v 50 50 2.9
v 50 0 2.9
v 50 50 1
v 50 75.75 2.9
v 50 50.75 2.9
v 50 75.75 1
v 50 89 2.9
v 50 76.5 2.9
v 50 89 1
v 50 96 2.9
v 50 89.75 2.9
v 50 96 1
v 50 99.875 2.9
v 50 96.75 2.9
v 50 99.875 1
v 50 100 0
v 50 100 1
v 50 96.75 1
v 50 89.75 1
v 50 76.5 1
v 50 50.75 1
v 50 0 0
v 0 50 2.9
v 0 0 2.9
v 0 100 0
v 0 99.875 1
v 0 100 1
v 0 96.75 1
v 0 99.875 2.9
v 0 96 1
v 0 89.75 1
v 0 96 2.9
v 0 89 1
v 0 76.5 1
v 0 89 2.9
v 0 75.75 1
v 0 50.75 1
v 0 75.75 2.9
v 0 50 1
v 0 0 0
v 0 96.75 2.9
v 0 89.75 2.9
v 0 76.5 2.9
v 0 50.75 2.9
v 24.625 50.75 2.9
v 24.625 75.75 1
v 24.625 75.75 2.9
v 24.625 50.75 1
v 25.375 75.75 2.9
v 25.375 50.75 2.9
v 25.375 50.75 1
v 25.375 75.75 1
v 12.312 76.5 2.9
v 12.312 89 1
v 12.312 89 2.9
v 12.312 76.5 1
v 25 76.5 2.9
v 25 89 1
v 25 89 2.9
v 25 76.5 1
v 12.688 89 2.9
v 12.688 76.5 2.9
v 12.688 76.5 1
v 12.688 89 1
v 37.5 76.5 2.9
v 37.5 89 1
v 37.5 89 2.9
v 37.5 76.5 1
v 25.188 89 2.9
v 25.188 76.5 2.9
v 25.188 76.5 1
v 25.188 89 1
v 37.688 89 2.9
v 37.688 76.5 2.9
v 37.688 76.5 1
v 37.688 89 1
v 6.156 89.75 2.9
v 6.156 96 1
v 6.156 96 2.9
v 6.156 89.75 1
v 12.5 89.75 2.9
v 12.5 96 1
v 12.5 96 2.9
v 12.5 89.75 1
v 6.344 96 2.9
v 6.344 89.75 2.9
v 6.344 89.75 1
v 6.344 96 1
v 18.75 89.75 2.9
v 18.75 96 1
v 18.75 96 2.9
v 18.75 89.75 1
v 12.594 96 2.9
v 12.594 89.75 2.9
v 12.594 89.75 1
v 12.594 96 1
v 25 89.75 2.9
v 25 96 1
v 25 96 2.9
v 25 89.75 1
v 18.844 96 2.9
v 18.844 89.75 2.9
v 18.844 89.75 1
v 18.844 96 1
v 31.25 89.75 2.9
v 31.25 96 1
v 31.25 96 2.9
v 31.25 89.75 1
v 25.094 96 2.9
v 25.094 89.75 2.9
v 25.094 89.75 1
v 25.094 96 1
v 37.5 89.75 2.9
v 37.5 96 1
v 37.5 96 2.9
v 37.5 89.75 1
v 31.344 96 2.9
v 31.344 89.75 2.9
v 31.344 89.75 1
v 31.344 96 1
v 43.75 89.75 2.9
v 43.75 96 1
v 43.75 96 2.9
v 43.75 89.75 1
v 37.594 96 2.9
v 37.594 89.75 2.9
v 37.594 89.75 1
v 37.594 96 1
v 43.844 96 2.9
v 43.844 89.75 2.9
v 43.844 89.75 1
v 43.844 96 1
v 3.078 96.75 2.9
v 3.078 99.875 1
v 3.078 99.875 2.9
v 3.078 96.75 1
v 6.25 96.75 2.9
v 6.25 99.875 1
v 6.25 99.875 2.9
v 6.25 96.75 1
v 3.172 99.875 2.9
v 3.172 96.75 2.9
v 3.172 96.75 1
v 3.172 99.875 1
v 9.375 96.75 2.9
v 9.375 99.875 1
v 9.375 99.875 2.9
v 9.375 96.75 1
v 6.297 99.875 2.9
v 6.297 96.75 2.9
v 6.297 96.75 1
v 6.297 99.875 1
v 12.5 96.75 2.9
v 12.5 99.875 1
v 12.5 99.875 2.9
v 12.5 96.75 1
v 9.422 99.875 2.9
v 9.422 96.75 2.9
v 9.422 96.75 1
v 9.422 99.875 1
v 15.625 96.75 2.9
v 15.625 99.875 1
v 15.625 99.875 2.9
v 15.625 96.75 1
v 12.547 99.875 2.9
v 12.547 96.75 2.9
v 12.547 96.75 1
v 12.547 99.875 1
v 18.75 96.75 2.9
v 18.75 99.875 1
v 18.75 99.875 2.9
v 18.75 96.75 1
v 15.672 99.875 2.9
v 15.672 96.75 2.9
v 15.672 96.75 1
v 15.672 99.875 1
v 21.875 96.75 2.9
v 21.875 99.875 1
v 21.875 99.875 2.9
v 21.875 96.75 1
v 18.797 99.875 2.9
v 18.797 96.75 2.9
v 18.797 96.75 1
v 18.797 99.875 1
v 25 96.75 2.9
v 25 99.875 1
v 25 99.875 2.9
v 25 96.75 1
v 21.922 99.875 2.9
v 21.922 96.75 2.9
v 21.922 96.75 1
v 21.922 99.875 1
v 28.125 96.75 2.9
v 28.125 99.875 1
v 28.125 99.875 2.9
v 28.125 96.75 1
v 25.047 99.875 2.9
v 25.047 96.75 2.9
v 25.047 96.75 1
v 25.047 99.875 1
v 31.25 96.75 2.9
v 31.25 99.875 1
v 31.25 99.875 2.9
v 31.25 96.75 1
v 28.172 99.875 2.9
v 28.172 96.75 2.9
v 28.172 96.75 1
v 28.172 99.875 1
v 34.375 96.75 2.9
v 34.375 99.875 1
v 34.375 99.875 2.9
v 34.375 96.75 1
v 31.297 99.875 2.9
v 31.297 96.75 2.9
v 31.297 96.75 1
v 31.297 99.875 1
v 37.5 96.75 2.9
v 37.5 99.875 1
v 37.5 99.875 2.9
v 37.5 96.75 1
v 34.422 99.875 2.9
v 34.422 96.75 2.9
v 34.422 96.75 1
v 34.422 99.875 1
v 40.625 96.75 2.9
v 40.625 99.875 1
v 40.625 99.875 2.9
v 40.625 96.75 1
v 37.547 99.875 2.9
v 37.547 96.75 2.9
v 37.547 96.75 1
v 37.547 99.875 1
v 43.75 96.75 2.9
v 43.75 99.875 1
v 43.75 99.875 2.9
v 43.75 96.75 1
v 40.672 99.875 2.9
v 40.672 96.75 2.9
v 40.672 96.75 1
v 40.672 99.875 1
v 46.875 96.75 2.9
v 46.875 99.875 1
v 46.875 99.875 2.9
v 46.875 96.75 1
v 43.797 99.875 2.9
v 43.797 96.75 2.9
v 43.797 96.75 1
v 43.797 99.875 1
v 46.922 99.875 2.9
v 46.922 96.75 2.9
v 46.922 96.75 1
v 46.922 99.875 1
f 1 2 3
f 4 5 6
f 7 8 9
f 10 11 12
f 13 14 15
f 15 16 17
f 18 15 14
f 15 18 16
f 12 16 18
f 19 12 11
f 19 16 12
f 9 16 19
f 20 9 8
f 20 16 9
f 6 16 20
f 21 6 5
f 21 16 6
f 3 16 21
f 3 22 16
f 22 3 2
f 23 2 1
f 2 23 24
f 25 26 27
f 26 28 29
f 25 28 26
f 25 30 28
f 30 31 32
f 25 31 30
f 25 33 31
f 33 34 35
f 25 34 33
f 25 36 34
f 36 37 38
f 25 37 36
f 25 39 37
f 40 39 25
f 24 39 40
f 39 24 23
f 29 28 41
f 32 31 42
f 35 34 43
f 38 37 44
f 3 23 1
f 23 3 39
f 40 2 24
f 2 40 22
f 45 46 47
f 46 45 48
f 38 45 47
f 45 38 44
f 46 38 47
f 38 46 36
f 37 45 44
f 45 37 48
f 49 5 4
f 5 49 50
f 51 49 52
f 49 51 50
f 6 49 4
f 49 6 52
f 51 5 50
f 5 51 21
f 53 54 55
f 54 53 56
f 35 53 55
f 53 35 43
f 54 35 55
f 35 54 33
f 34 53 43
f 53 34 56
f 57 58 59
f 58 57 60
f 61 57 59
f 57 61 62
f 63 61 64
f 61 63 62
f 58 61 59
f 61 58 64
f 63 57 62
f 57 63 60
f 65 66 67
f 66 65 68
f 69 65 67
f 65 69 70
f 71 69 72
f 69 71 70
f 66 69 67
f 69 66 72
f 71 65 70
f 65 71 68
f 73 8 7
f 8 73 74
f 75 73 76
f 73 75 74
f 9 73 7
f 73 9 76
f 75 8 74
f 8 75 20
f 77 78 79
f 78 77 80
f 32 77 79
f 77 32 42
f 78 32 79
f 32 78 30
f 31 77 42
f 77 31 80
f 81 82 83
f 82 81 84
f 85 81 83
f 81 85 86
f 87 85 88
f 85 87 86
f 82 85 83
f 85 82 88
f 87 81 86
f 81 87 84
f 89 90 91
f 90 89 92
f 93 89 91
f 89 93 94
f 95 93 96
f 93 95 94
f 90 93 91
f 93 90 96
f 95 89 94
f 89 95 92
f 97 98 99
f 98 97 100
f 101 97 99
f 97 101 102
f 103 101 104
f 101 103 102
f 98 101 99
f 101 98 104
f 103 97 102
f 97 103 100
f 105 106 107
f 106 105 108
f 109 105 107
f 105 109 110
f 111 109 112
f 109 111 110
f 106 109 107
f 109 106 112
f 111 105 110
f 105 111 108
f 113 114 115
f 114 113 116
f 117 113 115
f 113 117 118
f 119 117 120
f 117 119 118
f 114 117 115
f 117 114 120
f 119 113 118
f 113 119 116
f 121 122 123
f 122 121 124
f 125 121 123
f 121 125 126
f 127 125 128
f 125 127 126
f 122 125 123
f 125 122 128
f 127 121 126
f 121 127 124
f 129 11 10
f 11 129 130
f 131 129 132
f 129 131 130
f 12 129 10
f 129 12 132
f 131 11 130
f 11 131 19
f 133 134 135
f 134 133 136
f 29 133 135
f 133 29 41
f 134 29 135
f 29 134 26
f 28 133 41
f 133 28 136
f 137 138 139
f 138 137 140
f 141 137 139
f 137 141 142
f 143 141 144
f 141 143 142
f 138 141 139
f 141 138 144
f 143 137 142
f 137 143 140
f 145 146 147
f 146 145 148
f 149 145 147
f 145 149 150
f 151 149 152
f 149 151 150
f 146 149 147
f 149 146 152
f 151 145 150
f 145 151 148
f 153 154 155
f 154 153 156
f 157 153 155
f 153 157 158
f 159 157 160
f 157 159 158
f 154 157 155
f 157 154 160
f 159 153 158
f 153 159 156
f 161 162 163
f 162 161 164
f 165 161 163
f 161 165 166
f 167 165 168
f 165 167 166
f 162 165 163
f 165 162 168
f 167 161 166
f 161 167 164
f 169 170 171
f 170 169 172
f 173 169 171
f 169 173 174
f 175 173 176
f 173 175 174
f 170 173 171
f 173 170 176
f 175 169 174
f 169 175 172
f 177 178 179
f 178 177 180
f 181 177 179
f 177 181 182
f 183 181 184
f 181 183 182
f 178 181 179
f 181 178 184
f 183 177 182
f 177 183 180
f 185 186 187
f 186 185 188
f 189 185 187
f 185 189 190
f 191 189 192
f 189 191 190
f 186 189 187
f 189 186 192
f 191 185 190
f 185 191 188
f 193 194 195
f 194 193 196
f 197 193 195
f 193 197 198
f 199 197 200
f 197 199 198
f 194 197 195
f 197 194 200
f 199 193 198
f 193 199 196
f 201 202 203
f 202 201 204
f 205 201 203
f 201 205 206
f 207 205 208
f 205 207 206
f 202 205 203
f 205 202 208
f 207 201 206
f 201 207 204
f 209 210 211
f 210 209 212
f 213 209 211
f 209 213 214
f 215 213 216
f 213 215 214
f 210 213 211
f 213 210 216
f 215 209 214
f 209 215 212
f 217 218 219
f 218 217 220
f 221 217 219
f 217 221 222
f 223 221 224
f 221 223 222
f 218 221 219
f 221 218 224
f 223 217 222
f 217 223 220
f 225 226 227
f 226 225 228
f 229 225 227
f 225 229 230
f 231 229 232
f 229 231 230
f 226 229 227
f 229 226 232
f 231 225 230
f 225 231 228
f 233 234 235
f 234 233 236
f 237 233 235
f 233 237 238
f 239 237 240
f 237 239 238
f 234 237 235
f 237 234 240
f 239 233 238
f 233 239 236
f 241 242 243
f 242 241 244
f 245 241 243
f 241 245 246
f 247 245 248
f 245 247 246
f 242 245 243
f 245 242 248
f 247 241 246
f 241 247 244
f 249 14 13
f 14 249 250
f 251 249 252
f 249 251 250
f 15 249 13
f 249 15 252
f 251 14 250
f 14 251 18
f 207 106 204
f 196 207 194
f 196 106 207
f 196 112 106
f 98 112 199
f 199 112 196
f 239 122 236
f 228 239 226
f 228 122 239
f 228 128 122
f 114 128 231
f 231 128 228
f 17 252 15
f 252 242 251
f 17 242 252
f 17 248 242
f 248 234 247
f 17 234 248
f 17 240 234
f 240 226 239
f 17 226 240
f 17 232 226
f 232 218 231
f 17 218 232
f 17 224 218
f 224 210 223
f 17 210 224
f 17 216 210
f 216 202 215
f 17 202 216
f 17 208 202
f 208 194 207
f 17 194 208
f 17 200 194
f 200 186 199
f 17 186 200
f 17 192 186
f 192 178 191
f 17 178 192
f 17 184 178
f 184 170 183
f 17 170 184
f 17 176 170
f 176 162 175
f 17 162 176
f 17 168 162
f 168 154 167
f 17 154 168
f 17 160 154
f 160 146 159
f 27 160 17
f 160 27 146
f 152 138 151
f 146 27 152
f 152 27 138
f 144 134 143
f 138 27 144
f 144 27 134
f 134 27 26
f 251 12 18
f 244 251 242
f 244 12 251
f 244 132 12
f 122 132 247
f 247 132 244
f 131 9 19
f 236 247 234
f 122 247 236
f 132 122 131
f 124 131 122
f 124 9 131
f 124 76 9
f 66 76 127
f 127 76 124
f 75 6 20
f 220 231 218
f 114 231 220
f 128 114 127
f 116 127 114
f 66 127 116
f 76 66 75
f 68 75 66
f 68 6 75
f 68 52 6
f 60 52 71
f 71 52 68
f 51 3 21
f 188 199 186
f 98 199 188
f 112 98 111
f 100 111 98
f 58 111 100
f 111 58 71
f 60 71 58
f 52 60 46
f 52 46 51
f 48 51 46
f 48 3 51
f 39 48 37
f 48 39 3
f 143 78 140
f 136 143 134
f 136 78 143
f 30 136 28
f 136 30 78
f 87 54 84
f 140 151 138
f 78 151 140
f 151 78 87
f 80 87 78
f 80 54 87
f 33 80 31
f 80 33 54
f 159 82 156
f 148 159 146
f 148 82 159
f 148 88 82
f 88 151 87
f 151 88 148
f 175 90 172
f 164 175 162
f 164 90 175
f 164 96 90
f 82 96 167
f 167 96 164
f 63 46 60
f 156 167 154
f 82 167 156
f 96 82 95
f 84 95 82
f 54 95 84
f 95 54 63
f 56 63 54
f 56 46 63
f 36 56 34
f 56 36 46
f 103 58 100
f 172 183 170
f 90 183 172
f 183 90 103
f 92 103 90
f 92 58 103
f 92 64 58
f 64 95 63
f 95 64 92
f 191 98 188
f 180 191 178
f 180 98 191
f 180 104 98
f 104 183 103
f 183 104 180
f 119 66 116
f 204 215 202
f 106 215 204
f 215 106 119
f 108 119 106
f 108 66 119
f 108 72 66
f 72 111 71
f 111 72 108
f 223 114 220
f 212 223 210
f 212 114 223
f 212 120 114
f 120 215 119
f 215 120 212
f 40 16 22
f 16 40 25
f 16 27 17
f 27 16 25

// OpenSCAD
//All units are in millimeters

//Optimal settings
$fa = 1;
$fs = 0.4;

//Global constants
function separation() = 0.75;
function baseWidth() = 50;
function baseLength() = 50;
function baseHeight() = 2;

rotate([0, 0, 90])
    translate([0,-50,0])
        cube([100, 50, 1]);
translate([0,0,1-0.1])    
    pattern();

module pattern(){
    cube([baseWidth(), baseLength(), baseHeight()]);

    translate([0,baseWidth()+separation(),0])
        cube([baseWidth()/2-separation()/2, baseLength()/2, baseHeight()]);
    translate([baseLength()/2+separation()/2,baseWidth()+separation(),0])
        cube([baseWidth()/2-separation()/2, baseLength()/2, baseHeight()]);
        
    translate([0,baseWidth()+separation(),0])
        cube([baseWidth()/2-separation()/2, baseLength()/2, baseHeight()]);
    translate([baseLength()/2+separation()/2,baseWidth()+separation(),0])
        cube([baseWidth()/2-separation()/2, baseLength()/2, baseHeight()]);
        
    translate([0,baseWidth()+ baseWidth()/2 + separation()*2,0])
        cube([baseWidth()/4-separation()/4, baseLength()/4, baseHeight()]);
    translate([baseLength()/4+separation()/4,baseWidth()+baseWidth()/2+separation()*2,0])
        cube([baseWidth()/4-separation()/4, baseLength()/4, baseHeight()]);
    translate([2*baseLength()/4+separation()/4,baseWidth()+ baseWidth()/2 + separation()*2,0])
        cube([baseWidth()/4-separation()/4, baseLength()/4, baseHeight()]);
    translate([3*baseLength()/4+separation()/4,baseWidth()+baseWidth()/2+separation()*2,0])
        cube([baseWidth()/4-separation()/4, baseLength()/4, baseHeight()]);
        
    translate([0,baseWidth()+ baseWidth()/2+ baseWidth()/4 + separation()*3,0])
        cube([baseWidth()/8-separation()/8, baseLength()/8, baseHeight()]);
    translate([baseLength()/8+separation()/8,baseWidth()+baseWidth()/2+baseWidth()/4+separation()*3,0])
        cube([baseWidth()/8-separation()/8, baseLength()/8, baseHeight()]);
    translate([2*baseLength()/8+separation()/8,baseWidth()+baseWidth()/2+baseWidth()/4+separation()*3,0])
        cube([baseWidth()/8-separation()/8, baseLength()/8, baseHeight()]);
    translate([3*baseLength()/8+separation()/8,baseWidth()+baseWidth()/2+baseWidth()/4+separation()*3,0])
        cube([baseWidth()/8-separation()/8, baseLength()/8, baseHeight()]);
    translate([4*baseLength()/8+separation()/8,baseWidth()+ baseWidth()/2+ baseWidth()/4 + separation()*3,0])
        cube([baseWidth()/8-separation()/8, baseLength()/8, baseHeight()]);
    translate([5*baseLength()/8+separation()/8,baseWidth()+baseWidth()/2+baseWidth()/4+separation()*3,0])
        cube([baseWidth()/8-separation()/8, baseLength()/8, baseHeight()]);
    translate([6*baseLength()/8+separation()/8,baseWidth()+baseWidth()/2+baseWidth()/4+separation()*3,0])
        cube([baseWidth()/8-separation()/8, baseLength()/8, baseHeight()]);
    translate([7*baseLength()/8+separation()/8,baseWidth()+baseWidth()/2+baseWidth()/4+separation()*3,0])
        cube([baseWidth()/8-separation()/8, baseLength()/8, baseHeight()]);
       
       
    translate([0,baseWidth()+ baseWidth()/2+ baseWidth()/4 + baseWidth()/8 + separation()*4,0])
        cube([baseWidth()/16-separation()/16, baseLength()/16, baseHeight()]);
    translate([baseLength()/16+separation()/16,baseWidth()+baseWidth()/2+baseWidth()/4+baseWidth()/8+separation()*4,0])
        cube([baseWidth()/16-separation()/16, baseLength()/16, baseHeight()]);
    translate([2*baseLength()/16+separation()/16,baseWidth()+baseWidth()/2+baseWidth()/4+baseWidth()/8+separation()*4,0])
        cube([baseWidth()/16-separation()/16, baseLength()/16, baseHeight()]);
    translate([3*baseLength()/16+separation()/16,baseWidth()+baseWidth()/2+baseWidth()/4+baseWidth()/8+separation()*4,0])
        cube([baseWidth()/16-separation()/16, baseLength()/16, baseHeight()]);
    translate([4*baseLength()/16+separation()/16,baseWidth()+baseWidth()/2+baseWidth()/4+baseWidth()/8+separation()*4,0])
        cube([baseWidth()/16-separation()/16, baseLength()/16, baseHeight()]);
    translate([5*baseLength()/16+separation()/16,baseWidth()+baseWidth()/2+baseWidth()/4+baseWidth()/8+separation()*4,0])
        cube([baseWidth()/16-separation()/16, baseLength()/16, baseHeight()]);
    translate([6*baseLength()/16+separation()/16,baseWidth()+baseWidth()/2+baseWidth()/4+baseWidth()/8+separation()*4,0])
        cube([baseWidth()/16-separation()/16, baseLength()/16, baseHeight()]);
    translate([7*baseLength()/16+separation()/16,baseWidth()+baseWidth()/2+baseWidth()/4+baseWidth()/8+separation()*4,0])
        cube([baseWidth()/16-separation()/16, baseLength()/16, baseHeight()]);
    translate([8*baseLength()/16+separation()/16,baseWidth()+ baseWidth()/2+ baseWidth()/4 + baseWidth()/8 + separation()*4,0])
        cube([baseWidth()/16-separation()/16, baseLength()/16, baseHeight()]);
    translate([9*baseLength()/16+separation()/16,baseWidth()+baseWidth()/2+baseWidth()/4+baseWidth()/8+separation()*4,0])
        cube([baseWidth()/16-separation()/16, baseLength()/16, baseHeight()]);
    translate([10*baseLength()/16+separation()/16,baseWidth()+baseWidth()/2+baseWidth()/4+baseWidth()/8+separation()*4,0])
        cube([baseWidth()/16-separation()/16, baseLength()/16, baseHeight()]);
    translate([11*baseLength()/16+separation()/16,baseWidth()+baseWidth()/2+baseWidth()/4+baseWidth()/8+separation()*4,0])
        cube([baseWidth()/16-separation()/16, baseLength()/16, baseHeight()]);
    translate([12*baseLength()/16+separation()/16,baseWidth()+baseWidth()/2+baseWidth()/4+baseWidth()/8+separation()*4,0])
        cube([baseWidth()/16-separation()/16, baseLength()/16, baseHeight()]);
    translate([13*baseLength()/16+separation()/16,baseWidth()+baseWidth()/2+baseWidth()/4+baseWidth()/8+separation()*4,0])
        cube([baseWidth()/16-separation()/16, baseLength()/16, baseHeight()]);
    translate([14*baseLength()/16+separation()/16,baseWidth()+baseWidth()/2+baseWidth()/4+baseWidth()/8+separation()*4,0])
        cube([baseWidth()/16-separation()/16, baseLength()/16, baseHeight()]);
    translate([15*baseLength()/16+separation()/16,baseWidth()+baseWidth()/2+baseWidth()/4+baseWidth()/8+separation()*4,0])
        cube([baseWidth()/16-separation()/16, baseLength()/16, baseHeight()]);
}
